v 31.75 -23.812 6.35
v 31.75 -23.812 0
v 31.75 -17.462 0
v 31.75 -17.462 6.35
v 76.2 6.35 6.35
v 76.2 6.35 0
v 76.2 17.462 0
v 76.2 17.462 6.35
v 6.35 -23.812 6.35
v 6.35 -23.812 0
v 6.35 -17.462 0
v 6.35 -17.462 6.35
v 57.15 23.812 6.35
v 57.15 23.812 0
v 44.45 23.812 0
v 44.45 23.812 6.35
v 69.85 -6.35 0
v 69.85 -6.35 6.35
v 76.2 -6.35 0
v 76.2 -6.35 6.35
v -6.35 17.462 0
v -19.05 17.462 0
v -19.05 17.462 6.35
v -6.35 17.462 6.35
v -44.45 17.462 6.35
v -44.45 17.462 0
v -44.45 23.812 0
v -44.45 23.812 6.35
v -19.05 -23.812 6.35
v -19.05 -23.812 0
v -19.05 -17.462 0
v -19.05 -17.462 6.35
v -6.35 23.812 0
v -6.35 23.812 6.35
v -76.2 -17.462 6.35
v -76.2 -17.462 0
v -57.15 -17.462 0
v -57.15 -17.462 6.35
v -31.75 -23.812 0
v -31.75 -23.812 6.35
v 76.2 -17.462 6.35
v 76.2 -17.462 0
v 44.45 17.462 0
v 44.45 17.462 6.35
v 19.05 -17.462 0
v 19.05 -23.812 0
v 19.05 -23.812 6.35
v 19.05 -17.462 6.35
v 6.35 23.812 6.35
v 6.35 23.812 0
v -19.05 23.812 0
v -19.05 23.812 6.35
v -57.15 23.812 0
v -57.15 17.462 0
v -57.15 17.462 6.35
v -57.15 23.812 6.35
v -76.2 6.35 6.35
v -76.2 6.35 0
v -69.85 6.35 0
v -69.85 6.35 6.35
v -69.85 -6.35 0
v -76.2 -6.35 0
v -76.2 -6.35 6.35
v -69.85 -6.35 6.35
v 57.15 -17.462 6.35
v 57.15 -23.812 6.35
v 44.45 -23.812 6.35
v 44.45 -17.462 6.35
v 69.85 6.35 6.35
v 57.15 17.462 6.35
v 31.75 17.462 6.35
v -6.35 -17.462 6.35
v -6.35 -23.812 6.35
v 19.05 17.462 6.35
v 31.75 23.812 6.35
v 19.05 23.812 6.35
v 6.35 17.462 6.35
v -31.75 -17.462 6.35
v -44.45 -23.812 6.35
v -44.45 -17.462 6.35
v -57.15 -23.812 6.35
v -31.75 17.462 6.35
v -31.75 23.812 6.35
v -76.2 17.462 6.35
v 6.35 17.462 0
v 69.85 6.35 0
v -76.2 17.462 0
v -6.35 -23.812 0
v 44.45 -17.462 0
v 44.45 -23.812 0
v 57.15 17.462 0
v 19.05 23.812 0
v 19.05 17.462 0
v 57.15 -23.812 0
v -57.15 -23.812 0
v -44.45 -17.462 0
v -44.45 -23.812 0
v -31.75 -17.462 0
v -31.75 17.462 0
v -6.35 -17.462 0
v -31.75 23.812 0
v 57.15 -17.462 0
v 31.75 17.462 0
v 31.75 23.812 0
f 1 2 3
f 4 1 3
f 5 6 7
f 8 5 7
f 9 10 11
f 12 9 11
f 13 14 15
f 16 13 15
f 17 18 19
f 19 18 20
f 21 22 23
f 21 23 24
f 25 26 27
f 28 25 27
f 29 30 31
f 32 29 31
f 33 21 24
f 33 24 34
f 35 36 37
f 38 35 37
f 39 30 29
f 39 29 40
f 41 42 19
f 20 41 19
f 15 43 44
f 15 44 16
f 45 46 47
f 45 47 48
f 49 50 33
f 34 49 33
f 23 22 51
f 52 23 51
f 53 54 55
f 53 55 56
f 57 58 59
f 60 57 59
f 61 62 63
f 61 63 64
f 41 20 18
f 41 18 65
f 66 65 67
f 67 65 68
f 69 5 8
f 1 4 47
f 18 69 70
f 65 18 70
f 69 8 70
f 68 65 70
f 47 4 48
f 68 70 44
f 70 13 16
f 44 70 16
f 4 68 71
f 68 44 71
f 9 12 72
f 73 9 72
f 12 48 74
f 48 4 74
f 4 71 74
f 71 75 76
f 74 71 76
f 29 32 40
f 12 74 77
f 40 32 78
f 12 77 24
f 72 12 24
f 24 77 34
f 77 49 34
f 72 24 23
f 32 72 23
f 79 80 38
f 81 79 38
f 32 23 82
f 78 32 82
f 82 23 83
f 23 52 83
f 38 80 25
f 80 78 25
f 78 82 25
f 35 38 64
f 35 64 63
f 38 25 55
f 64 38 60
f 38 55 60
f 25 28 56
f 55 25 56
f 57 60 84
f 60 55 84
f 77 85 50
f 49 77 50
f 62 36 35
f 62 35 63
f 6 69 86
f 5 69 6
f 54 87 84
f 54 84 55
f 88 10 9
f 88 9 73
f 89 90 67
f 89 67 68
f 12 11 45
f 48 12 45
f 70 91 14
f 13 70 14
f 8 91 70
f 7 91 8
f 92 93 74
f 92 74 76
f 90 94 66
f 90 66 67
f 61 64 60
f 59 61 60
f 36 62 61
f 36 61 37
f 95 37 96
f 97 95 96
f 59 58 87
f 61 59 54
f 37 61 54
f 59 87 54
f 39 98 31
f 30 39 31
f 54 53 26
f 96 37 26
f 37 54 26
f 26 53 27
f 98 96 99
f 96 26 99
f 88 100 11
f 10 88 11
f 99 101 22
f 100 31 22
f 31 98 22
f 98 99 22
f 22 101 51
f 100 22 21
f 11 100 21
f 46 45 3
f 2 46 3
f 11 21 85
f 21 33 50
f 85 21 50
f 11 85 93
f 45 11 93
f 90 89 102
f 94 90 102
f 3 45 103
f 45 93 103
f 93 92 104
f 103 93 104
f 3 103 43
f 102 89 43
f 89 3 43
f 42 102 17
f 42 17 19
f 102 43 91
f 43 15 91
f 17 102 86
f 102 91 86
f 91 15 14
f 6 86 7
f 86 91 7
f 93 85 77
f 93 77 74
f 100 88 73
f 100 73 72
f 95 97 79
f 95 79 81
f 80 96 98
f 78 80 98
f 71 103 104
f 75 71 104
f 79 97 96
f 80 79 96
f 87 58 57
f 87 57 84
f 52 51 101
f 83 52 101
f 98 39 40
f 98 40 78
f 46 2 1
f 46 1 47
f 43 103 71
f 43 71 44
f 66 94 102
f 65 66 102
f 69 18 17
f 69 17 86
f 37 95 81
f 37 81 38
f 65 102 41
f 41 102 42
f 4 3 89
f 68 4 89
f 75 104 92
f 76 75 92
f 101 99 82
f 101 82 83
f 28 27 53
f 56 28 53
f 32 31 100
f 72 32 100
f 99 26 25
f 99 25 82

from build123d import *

# Parameters (mm, degrees)
SKETCH1_W            = 152.4
SKETCH1_H            = 34.925
MASS_DEPTH           = 6.35
SKETCH3_W            = 12.7
SKETCH3_H            = 12.7
TOP_TOOTH_DEPTH      = 6.35
TOP_PUZZLE_COUNT     = 3
TOP_PUZZLE_PITCH     = 25.4
TOP_PUZZLE_COL_COUNT = 3
TOP_PUZZLE_COL_PITCH = 25.4
SKETCH4_W            = 12.7
SKETCH4_H            = 12.7
SIDE_TOOTH_DEPTH     = 81.086188923


with BuildPart() as part:
    # Sketch1 → Mass (new body)
    with BuildSketch(Plane.XY):
        Rectangle(SKETCH1_W, SKETCH1_H)
    extrude(amount=MASS_DEPTH)

    # Sketch3 → Top Tooth (add)
    with BuildSketch(Plane(origin=(0, 0, 0), x_dir=(-1, 0, 0), z_dir=(0, 0, -1))):
        with Locations((0, 17.4625)):
            Rectangle(SKETCH3_W, SKETCH3_H)
        with Locations((0, -17.4625)):
            Rectangle(SKETCH3_W, SKETCH3_H)
    top_tooth = extrude(amount=-TOP_TOOTH_DEPTH)

    # Top Puzzle: Top Tooth ×3
    with Locations(*[(-i * TOP_PUZZLE_PITCH, 0, 0) for i in range(1, TOP_PUZZLE_COUNT)]):
        add(top_tooth)

    # Top Puzzle col: Top Tooth ×3
    with Locations(*[(i * TOP_PUZZLE_COL_PITCH, 0, 0) for i in range(1, TOP_PUZZLE_COL_COUNT)]):
        add(top_tooth)

    # Sketch4 → Side Tooth (cut, through all)
    with BuildSketch(Plane.XY.offset(6.35)):
        with Locations((76.2, 0)):
            Rectangle(SKETCH4_W, SKETCH4_H)
        with Locations((-76.2, 0)):
            Rectangle(SKETCH4_W, SKETCH4_H)
    extrude(amount=-SIDE_TOOTH_DEPTH, mode=Mode.SUBTRACT)


solid = part.part
